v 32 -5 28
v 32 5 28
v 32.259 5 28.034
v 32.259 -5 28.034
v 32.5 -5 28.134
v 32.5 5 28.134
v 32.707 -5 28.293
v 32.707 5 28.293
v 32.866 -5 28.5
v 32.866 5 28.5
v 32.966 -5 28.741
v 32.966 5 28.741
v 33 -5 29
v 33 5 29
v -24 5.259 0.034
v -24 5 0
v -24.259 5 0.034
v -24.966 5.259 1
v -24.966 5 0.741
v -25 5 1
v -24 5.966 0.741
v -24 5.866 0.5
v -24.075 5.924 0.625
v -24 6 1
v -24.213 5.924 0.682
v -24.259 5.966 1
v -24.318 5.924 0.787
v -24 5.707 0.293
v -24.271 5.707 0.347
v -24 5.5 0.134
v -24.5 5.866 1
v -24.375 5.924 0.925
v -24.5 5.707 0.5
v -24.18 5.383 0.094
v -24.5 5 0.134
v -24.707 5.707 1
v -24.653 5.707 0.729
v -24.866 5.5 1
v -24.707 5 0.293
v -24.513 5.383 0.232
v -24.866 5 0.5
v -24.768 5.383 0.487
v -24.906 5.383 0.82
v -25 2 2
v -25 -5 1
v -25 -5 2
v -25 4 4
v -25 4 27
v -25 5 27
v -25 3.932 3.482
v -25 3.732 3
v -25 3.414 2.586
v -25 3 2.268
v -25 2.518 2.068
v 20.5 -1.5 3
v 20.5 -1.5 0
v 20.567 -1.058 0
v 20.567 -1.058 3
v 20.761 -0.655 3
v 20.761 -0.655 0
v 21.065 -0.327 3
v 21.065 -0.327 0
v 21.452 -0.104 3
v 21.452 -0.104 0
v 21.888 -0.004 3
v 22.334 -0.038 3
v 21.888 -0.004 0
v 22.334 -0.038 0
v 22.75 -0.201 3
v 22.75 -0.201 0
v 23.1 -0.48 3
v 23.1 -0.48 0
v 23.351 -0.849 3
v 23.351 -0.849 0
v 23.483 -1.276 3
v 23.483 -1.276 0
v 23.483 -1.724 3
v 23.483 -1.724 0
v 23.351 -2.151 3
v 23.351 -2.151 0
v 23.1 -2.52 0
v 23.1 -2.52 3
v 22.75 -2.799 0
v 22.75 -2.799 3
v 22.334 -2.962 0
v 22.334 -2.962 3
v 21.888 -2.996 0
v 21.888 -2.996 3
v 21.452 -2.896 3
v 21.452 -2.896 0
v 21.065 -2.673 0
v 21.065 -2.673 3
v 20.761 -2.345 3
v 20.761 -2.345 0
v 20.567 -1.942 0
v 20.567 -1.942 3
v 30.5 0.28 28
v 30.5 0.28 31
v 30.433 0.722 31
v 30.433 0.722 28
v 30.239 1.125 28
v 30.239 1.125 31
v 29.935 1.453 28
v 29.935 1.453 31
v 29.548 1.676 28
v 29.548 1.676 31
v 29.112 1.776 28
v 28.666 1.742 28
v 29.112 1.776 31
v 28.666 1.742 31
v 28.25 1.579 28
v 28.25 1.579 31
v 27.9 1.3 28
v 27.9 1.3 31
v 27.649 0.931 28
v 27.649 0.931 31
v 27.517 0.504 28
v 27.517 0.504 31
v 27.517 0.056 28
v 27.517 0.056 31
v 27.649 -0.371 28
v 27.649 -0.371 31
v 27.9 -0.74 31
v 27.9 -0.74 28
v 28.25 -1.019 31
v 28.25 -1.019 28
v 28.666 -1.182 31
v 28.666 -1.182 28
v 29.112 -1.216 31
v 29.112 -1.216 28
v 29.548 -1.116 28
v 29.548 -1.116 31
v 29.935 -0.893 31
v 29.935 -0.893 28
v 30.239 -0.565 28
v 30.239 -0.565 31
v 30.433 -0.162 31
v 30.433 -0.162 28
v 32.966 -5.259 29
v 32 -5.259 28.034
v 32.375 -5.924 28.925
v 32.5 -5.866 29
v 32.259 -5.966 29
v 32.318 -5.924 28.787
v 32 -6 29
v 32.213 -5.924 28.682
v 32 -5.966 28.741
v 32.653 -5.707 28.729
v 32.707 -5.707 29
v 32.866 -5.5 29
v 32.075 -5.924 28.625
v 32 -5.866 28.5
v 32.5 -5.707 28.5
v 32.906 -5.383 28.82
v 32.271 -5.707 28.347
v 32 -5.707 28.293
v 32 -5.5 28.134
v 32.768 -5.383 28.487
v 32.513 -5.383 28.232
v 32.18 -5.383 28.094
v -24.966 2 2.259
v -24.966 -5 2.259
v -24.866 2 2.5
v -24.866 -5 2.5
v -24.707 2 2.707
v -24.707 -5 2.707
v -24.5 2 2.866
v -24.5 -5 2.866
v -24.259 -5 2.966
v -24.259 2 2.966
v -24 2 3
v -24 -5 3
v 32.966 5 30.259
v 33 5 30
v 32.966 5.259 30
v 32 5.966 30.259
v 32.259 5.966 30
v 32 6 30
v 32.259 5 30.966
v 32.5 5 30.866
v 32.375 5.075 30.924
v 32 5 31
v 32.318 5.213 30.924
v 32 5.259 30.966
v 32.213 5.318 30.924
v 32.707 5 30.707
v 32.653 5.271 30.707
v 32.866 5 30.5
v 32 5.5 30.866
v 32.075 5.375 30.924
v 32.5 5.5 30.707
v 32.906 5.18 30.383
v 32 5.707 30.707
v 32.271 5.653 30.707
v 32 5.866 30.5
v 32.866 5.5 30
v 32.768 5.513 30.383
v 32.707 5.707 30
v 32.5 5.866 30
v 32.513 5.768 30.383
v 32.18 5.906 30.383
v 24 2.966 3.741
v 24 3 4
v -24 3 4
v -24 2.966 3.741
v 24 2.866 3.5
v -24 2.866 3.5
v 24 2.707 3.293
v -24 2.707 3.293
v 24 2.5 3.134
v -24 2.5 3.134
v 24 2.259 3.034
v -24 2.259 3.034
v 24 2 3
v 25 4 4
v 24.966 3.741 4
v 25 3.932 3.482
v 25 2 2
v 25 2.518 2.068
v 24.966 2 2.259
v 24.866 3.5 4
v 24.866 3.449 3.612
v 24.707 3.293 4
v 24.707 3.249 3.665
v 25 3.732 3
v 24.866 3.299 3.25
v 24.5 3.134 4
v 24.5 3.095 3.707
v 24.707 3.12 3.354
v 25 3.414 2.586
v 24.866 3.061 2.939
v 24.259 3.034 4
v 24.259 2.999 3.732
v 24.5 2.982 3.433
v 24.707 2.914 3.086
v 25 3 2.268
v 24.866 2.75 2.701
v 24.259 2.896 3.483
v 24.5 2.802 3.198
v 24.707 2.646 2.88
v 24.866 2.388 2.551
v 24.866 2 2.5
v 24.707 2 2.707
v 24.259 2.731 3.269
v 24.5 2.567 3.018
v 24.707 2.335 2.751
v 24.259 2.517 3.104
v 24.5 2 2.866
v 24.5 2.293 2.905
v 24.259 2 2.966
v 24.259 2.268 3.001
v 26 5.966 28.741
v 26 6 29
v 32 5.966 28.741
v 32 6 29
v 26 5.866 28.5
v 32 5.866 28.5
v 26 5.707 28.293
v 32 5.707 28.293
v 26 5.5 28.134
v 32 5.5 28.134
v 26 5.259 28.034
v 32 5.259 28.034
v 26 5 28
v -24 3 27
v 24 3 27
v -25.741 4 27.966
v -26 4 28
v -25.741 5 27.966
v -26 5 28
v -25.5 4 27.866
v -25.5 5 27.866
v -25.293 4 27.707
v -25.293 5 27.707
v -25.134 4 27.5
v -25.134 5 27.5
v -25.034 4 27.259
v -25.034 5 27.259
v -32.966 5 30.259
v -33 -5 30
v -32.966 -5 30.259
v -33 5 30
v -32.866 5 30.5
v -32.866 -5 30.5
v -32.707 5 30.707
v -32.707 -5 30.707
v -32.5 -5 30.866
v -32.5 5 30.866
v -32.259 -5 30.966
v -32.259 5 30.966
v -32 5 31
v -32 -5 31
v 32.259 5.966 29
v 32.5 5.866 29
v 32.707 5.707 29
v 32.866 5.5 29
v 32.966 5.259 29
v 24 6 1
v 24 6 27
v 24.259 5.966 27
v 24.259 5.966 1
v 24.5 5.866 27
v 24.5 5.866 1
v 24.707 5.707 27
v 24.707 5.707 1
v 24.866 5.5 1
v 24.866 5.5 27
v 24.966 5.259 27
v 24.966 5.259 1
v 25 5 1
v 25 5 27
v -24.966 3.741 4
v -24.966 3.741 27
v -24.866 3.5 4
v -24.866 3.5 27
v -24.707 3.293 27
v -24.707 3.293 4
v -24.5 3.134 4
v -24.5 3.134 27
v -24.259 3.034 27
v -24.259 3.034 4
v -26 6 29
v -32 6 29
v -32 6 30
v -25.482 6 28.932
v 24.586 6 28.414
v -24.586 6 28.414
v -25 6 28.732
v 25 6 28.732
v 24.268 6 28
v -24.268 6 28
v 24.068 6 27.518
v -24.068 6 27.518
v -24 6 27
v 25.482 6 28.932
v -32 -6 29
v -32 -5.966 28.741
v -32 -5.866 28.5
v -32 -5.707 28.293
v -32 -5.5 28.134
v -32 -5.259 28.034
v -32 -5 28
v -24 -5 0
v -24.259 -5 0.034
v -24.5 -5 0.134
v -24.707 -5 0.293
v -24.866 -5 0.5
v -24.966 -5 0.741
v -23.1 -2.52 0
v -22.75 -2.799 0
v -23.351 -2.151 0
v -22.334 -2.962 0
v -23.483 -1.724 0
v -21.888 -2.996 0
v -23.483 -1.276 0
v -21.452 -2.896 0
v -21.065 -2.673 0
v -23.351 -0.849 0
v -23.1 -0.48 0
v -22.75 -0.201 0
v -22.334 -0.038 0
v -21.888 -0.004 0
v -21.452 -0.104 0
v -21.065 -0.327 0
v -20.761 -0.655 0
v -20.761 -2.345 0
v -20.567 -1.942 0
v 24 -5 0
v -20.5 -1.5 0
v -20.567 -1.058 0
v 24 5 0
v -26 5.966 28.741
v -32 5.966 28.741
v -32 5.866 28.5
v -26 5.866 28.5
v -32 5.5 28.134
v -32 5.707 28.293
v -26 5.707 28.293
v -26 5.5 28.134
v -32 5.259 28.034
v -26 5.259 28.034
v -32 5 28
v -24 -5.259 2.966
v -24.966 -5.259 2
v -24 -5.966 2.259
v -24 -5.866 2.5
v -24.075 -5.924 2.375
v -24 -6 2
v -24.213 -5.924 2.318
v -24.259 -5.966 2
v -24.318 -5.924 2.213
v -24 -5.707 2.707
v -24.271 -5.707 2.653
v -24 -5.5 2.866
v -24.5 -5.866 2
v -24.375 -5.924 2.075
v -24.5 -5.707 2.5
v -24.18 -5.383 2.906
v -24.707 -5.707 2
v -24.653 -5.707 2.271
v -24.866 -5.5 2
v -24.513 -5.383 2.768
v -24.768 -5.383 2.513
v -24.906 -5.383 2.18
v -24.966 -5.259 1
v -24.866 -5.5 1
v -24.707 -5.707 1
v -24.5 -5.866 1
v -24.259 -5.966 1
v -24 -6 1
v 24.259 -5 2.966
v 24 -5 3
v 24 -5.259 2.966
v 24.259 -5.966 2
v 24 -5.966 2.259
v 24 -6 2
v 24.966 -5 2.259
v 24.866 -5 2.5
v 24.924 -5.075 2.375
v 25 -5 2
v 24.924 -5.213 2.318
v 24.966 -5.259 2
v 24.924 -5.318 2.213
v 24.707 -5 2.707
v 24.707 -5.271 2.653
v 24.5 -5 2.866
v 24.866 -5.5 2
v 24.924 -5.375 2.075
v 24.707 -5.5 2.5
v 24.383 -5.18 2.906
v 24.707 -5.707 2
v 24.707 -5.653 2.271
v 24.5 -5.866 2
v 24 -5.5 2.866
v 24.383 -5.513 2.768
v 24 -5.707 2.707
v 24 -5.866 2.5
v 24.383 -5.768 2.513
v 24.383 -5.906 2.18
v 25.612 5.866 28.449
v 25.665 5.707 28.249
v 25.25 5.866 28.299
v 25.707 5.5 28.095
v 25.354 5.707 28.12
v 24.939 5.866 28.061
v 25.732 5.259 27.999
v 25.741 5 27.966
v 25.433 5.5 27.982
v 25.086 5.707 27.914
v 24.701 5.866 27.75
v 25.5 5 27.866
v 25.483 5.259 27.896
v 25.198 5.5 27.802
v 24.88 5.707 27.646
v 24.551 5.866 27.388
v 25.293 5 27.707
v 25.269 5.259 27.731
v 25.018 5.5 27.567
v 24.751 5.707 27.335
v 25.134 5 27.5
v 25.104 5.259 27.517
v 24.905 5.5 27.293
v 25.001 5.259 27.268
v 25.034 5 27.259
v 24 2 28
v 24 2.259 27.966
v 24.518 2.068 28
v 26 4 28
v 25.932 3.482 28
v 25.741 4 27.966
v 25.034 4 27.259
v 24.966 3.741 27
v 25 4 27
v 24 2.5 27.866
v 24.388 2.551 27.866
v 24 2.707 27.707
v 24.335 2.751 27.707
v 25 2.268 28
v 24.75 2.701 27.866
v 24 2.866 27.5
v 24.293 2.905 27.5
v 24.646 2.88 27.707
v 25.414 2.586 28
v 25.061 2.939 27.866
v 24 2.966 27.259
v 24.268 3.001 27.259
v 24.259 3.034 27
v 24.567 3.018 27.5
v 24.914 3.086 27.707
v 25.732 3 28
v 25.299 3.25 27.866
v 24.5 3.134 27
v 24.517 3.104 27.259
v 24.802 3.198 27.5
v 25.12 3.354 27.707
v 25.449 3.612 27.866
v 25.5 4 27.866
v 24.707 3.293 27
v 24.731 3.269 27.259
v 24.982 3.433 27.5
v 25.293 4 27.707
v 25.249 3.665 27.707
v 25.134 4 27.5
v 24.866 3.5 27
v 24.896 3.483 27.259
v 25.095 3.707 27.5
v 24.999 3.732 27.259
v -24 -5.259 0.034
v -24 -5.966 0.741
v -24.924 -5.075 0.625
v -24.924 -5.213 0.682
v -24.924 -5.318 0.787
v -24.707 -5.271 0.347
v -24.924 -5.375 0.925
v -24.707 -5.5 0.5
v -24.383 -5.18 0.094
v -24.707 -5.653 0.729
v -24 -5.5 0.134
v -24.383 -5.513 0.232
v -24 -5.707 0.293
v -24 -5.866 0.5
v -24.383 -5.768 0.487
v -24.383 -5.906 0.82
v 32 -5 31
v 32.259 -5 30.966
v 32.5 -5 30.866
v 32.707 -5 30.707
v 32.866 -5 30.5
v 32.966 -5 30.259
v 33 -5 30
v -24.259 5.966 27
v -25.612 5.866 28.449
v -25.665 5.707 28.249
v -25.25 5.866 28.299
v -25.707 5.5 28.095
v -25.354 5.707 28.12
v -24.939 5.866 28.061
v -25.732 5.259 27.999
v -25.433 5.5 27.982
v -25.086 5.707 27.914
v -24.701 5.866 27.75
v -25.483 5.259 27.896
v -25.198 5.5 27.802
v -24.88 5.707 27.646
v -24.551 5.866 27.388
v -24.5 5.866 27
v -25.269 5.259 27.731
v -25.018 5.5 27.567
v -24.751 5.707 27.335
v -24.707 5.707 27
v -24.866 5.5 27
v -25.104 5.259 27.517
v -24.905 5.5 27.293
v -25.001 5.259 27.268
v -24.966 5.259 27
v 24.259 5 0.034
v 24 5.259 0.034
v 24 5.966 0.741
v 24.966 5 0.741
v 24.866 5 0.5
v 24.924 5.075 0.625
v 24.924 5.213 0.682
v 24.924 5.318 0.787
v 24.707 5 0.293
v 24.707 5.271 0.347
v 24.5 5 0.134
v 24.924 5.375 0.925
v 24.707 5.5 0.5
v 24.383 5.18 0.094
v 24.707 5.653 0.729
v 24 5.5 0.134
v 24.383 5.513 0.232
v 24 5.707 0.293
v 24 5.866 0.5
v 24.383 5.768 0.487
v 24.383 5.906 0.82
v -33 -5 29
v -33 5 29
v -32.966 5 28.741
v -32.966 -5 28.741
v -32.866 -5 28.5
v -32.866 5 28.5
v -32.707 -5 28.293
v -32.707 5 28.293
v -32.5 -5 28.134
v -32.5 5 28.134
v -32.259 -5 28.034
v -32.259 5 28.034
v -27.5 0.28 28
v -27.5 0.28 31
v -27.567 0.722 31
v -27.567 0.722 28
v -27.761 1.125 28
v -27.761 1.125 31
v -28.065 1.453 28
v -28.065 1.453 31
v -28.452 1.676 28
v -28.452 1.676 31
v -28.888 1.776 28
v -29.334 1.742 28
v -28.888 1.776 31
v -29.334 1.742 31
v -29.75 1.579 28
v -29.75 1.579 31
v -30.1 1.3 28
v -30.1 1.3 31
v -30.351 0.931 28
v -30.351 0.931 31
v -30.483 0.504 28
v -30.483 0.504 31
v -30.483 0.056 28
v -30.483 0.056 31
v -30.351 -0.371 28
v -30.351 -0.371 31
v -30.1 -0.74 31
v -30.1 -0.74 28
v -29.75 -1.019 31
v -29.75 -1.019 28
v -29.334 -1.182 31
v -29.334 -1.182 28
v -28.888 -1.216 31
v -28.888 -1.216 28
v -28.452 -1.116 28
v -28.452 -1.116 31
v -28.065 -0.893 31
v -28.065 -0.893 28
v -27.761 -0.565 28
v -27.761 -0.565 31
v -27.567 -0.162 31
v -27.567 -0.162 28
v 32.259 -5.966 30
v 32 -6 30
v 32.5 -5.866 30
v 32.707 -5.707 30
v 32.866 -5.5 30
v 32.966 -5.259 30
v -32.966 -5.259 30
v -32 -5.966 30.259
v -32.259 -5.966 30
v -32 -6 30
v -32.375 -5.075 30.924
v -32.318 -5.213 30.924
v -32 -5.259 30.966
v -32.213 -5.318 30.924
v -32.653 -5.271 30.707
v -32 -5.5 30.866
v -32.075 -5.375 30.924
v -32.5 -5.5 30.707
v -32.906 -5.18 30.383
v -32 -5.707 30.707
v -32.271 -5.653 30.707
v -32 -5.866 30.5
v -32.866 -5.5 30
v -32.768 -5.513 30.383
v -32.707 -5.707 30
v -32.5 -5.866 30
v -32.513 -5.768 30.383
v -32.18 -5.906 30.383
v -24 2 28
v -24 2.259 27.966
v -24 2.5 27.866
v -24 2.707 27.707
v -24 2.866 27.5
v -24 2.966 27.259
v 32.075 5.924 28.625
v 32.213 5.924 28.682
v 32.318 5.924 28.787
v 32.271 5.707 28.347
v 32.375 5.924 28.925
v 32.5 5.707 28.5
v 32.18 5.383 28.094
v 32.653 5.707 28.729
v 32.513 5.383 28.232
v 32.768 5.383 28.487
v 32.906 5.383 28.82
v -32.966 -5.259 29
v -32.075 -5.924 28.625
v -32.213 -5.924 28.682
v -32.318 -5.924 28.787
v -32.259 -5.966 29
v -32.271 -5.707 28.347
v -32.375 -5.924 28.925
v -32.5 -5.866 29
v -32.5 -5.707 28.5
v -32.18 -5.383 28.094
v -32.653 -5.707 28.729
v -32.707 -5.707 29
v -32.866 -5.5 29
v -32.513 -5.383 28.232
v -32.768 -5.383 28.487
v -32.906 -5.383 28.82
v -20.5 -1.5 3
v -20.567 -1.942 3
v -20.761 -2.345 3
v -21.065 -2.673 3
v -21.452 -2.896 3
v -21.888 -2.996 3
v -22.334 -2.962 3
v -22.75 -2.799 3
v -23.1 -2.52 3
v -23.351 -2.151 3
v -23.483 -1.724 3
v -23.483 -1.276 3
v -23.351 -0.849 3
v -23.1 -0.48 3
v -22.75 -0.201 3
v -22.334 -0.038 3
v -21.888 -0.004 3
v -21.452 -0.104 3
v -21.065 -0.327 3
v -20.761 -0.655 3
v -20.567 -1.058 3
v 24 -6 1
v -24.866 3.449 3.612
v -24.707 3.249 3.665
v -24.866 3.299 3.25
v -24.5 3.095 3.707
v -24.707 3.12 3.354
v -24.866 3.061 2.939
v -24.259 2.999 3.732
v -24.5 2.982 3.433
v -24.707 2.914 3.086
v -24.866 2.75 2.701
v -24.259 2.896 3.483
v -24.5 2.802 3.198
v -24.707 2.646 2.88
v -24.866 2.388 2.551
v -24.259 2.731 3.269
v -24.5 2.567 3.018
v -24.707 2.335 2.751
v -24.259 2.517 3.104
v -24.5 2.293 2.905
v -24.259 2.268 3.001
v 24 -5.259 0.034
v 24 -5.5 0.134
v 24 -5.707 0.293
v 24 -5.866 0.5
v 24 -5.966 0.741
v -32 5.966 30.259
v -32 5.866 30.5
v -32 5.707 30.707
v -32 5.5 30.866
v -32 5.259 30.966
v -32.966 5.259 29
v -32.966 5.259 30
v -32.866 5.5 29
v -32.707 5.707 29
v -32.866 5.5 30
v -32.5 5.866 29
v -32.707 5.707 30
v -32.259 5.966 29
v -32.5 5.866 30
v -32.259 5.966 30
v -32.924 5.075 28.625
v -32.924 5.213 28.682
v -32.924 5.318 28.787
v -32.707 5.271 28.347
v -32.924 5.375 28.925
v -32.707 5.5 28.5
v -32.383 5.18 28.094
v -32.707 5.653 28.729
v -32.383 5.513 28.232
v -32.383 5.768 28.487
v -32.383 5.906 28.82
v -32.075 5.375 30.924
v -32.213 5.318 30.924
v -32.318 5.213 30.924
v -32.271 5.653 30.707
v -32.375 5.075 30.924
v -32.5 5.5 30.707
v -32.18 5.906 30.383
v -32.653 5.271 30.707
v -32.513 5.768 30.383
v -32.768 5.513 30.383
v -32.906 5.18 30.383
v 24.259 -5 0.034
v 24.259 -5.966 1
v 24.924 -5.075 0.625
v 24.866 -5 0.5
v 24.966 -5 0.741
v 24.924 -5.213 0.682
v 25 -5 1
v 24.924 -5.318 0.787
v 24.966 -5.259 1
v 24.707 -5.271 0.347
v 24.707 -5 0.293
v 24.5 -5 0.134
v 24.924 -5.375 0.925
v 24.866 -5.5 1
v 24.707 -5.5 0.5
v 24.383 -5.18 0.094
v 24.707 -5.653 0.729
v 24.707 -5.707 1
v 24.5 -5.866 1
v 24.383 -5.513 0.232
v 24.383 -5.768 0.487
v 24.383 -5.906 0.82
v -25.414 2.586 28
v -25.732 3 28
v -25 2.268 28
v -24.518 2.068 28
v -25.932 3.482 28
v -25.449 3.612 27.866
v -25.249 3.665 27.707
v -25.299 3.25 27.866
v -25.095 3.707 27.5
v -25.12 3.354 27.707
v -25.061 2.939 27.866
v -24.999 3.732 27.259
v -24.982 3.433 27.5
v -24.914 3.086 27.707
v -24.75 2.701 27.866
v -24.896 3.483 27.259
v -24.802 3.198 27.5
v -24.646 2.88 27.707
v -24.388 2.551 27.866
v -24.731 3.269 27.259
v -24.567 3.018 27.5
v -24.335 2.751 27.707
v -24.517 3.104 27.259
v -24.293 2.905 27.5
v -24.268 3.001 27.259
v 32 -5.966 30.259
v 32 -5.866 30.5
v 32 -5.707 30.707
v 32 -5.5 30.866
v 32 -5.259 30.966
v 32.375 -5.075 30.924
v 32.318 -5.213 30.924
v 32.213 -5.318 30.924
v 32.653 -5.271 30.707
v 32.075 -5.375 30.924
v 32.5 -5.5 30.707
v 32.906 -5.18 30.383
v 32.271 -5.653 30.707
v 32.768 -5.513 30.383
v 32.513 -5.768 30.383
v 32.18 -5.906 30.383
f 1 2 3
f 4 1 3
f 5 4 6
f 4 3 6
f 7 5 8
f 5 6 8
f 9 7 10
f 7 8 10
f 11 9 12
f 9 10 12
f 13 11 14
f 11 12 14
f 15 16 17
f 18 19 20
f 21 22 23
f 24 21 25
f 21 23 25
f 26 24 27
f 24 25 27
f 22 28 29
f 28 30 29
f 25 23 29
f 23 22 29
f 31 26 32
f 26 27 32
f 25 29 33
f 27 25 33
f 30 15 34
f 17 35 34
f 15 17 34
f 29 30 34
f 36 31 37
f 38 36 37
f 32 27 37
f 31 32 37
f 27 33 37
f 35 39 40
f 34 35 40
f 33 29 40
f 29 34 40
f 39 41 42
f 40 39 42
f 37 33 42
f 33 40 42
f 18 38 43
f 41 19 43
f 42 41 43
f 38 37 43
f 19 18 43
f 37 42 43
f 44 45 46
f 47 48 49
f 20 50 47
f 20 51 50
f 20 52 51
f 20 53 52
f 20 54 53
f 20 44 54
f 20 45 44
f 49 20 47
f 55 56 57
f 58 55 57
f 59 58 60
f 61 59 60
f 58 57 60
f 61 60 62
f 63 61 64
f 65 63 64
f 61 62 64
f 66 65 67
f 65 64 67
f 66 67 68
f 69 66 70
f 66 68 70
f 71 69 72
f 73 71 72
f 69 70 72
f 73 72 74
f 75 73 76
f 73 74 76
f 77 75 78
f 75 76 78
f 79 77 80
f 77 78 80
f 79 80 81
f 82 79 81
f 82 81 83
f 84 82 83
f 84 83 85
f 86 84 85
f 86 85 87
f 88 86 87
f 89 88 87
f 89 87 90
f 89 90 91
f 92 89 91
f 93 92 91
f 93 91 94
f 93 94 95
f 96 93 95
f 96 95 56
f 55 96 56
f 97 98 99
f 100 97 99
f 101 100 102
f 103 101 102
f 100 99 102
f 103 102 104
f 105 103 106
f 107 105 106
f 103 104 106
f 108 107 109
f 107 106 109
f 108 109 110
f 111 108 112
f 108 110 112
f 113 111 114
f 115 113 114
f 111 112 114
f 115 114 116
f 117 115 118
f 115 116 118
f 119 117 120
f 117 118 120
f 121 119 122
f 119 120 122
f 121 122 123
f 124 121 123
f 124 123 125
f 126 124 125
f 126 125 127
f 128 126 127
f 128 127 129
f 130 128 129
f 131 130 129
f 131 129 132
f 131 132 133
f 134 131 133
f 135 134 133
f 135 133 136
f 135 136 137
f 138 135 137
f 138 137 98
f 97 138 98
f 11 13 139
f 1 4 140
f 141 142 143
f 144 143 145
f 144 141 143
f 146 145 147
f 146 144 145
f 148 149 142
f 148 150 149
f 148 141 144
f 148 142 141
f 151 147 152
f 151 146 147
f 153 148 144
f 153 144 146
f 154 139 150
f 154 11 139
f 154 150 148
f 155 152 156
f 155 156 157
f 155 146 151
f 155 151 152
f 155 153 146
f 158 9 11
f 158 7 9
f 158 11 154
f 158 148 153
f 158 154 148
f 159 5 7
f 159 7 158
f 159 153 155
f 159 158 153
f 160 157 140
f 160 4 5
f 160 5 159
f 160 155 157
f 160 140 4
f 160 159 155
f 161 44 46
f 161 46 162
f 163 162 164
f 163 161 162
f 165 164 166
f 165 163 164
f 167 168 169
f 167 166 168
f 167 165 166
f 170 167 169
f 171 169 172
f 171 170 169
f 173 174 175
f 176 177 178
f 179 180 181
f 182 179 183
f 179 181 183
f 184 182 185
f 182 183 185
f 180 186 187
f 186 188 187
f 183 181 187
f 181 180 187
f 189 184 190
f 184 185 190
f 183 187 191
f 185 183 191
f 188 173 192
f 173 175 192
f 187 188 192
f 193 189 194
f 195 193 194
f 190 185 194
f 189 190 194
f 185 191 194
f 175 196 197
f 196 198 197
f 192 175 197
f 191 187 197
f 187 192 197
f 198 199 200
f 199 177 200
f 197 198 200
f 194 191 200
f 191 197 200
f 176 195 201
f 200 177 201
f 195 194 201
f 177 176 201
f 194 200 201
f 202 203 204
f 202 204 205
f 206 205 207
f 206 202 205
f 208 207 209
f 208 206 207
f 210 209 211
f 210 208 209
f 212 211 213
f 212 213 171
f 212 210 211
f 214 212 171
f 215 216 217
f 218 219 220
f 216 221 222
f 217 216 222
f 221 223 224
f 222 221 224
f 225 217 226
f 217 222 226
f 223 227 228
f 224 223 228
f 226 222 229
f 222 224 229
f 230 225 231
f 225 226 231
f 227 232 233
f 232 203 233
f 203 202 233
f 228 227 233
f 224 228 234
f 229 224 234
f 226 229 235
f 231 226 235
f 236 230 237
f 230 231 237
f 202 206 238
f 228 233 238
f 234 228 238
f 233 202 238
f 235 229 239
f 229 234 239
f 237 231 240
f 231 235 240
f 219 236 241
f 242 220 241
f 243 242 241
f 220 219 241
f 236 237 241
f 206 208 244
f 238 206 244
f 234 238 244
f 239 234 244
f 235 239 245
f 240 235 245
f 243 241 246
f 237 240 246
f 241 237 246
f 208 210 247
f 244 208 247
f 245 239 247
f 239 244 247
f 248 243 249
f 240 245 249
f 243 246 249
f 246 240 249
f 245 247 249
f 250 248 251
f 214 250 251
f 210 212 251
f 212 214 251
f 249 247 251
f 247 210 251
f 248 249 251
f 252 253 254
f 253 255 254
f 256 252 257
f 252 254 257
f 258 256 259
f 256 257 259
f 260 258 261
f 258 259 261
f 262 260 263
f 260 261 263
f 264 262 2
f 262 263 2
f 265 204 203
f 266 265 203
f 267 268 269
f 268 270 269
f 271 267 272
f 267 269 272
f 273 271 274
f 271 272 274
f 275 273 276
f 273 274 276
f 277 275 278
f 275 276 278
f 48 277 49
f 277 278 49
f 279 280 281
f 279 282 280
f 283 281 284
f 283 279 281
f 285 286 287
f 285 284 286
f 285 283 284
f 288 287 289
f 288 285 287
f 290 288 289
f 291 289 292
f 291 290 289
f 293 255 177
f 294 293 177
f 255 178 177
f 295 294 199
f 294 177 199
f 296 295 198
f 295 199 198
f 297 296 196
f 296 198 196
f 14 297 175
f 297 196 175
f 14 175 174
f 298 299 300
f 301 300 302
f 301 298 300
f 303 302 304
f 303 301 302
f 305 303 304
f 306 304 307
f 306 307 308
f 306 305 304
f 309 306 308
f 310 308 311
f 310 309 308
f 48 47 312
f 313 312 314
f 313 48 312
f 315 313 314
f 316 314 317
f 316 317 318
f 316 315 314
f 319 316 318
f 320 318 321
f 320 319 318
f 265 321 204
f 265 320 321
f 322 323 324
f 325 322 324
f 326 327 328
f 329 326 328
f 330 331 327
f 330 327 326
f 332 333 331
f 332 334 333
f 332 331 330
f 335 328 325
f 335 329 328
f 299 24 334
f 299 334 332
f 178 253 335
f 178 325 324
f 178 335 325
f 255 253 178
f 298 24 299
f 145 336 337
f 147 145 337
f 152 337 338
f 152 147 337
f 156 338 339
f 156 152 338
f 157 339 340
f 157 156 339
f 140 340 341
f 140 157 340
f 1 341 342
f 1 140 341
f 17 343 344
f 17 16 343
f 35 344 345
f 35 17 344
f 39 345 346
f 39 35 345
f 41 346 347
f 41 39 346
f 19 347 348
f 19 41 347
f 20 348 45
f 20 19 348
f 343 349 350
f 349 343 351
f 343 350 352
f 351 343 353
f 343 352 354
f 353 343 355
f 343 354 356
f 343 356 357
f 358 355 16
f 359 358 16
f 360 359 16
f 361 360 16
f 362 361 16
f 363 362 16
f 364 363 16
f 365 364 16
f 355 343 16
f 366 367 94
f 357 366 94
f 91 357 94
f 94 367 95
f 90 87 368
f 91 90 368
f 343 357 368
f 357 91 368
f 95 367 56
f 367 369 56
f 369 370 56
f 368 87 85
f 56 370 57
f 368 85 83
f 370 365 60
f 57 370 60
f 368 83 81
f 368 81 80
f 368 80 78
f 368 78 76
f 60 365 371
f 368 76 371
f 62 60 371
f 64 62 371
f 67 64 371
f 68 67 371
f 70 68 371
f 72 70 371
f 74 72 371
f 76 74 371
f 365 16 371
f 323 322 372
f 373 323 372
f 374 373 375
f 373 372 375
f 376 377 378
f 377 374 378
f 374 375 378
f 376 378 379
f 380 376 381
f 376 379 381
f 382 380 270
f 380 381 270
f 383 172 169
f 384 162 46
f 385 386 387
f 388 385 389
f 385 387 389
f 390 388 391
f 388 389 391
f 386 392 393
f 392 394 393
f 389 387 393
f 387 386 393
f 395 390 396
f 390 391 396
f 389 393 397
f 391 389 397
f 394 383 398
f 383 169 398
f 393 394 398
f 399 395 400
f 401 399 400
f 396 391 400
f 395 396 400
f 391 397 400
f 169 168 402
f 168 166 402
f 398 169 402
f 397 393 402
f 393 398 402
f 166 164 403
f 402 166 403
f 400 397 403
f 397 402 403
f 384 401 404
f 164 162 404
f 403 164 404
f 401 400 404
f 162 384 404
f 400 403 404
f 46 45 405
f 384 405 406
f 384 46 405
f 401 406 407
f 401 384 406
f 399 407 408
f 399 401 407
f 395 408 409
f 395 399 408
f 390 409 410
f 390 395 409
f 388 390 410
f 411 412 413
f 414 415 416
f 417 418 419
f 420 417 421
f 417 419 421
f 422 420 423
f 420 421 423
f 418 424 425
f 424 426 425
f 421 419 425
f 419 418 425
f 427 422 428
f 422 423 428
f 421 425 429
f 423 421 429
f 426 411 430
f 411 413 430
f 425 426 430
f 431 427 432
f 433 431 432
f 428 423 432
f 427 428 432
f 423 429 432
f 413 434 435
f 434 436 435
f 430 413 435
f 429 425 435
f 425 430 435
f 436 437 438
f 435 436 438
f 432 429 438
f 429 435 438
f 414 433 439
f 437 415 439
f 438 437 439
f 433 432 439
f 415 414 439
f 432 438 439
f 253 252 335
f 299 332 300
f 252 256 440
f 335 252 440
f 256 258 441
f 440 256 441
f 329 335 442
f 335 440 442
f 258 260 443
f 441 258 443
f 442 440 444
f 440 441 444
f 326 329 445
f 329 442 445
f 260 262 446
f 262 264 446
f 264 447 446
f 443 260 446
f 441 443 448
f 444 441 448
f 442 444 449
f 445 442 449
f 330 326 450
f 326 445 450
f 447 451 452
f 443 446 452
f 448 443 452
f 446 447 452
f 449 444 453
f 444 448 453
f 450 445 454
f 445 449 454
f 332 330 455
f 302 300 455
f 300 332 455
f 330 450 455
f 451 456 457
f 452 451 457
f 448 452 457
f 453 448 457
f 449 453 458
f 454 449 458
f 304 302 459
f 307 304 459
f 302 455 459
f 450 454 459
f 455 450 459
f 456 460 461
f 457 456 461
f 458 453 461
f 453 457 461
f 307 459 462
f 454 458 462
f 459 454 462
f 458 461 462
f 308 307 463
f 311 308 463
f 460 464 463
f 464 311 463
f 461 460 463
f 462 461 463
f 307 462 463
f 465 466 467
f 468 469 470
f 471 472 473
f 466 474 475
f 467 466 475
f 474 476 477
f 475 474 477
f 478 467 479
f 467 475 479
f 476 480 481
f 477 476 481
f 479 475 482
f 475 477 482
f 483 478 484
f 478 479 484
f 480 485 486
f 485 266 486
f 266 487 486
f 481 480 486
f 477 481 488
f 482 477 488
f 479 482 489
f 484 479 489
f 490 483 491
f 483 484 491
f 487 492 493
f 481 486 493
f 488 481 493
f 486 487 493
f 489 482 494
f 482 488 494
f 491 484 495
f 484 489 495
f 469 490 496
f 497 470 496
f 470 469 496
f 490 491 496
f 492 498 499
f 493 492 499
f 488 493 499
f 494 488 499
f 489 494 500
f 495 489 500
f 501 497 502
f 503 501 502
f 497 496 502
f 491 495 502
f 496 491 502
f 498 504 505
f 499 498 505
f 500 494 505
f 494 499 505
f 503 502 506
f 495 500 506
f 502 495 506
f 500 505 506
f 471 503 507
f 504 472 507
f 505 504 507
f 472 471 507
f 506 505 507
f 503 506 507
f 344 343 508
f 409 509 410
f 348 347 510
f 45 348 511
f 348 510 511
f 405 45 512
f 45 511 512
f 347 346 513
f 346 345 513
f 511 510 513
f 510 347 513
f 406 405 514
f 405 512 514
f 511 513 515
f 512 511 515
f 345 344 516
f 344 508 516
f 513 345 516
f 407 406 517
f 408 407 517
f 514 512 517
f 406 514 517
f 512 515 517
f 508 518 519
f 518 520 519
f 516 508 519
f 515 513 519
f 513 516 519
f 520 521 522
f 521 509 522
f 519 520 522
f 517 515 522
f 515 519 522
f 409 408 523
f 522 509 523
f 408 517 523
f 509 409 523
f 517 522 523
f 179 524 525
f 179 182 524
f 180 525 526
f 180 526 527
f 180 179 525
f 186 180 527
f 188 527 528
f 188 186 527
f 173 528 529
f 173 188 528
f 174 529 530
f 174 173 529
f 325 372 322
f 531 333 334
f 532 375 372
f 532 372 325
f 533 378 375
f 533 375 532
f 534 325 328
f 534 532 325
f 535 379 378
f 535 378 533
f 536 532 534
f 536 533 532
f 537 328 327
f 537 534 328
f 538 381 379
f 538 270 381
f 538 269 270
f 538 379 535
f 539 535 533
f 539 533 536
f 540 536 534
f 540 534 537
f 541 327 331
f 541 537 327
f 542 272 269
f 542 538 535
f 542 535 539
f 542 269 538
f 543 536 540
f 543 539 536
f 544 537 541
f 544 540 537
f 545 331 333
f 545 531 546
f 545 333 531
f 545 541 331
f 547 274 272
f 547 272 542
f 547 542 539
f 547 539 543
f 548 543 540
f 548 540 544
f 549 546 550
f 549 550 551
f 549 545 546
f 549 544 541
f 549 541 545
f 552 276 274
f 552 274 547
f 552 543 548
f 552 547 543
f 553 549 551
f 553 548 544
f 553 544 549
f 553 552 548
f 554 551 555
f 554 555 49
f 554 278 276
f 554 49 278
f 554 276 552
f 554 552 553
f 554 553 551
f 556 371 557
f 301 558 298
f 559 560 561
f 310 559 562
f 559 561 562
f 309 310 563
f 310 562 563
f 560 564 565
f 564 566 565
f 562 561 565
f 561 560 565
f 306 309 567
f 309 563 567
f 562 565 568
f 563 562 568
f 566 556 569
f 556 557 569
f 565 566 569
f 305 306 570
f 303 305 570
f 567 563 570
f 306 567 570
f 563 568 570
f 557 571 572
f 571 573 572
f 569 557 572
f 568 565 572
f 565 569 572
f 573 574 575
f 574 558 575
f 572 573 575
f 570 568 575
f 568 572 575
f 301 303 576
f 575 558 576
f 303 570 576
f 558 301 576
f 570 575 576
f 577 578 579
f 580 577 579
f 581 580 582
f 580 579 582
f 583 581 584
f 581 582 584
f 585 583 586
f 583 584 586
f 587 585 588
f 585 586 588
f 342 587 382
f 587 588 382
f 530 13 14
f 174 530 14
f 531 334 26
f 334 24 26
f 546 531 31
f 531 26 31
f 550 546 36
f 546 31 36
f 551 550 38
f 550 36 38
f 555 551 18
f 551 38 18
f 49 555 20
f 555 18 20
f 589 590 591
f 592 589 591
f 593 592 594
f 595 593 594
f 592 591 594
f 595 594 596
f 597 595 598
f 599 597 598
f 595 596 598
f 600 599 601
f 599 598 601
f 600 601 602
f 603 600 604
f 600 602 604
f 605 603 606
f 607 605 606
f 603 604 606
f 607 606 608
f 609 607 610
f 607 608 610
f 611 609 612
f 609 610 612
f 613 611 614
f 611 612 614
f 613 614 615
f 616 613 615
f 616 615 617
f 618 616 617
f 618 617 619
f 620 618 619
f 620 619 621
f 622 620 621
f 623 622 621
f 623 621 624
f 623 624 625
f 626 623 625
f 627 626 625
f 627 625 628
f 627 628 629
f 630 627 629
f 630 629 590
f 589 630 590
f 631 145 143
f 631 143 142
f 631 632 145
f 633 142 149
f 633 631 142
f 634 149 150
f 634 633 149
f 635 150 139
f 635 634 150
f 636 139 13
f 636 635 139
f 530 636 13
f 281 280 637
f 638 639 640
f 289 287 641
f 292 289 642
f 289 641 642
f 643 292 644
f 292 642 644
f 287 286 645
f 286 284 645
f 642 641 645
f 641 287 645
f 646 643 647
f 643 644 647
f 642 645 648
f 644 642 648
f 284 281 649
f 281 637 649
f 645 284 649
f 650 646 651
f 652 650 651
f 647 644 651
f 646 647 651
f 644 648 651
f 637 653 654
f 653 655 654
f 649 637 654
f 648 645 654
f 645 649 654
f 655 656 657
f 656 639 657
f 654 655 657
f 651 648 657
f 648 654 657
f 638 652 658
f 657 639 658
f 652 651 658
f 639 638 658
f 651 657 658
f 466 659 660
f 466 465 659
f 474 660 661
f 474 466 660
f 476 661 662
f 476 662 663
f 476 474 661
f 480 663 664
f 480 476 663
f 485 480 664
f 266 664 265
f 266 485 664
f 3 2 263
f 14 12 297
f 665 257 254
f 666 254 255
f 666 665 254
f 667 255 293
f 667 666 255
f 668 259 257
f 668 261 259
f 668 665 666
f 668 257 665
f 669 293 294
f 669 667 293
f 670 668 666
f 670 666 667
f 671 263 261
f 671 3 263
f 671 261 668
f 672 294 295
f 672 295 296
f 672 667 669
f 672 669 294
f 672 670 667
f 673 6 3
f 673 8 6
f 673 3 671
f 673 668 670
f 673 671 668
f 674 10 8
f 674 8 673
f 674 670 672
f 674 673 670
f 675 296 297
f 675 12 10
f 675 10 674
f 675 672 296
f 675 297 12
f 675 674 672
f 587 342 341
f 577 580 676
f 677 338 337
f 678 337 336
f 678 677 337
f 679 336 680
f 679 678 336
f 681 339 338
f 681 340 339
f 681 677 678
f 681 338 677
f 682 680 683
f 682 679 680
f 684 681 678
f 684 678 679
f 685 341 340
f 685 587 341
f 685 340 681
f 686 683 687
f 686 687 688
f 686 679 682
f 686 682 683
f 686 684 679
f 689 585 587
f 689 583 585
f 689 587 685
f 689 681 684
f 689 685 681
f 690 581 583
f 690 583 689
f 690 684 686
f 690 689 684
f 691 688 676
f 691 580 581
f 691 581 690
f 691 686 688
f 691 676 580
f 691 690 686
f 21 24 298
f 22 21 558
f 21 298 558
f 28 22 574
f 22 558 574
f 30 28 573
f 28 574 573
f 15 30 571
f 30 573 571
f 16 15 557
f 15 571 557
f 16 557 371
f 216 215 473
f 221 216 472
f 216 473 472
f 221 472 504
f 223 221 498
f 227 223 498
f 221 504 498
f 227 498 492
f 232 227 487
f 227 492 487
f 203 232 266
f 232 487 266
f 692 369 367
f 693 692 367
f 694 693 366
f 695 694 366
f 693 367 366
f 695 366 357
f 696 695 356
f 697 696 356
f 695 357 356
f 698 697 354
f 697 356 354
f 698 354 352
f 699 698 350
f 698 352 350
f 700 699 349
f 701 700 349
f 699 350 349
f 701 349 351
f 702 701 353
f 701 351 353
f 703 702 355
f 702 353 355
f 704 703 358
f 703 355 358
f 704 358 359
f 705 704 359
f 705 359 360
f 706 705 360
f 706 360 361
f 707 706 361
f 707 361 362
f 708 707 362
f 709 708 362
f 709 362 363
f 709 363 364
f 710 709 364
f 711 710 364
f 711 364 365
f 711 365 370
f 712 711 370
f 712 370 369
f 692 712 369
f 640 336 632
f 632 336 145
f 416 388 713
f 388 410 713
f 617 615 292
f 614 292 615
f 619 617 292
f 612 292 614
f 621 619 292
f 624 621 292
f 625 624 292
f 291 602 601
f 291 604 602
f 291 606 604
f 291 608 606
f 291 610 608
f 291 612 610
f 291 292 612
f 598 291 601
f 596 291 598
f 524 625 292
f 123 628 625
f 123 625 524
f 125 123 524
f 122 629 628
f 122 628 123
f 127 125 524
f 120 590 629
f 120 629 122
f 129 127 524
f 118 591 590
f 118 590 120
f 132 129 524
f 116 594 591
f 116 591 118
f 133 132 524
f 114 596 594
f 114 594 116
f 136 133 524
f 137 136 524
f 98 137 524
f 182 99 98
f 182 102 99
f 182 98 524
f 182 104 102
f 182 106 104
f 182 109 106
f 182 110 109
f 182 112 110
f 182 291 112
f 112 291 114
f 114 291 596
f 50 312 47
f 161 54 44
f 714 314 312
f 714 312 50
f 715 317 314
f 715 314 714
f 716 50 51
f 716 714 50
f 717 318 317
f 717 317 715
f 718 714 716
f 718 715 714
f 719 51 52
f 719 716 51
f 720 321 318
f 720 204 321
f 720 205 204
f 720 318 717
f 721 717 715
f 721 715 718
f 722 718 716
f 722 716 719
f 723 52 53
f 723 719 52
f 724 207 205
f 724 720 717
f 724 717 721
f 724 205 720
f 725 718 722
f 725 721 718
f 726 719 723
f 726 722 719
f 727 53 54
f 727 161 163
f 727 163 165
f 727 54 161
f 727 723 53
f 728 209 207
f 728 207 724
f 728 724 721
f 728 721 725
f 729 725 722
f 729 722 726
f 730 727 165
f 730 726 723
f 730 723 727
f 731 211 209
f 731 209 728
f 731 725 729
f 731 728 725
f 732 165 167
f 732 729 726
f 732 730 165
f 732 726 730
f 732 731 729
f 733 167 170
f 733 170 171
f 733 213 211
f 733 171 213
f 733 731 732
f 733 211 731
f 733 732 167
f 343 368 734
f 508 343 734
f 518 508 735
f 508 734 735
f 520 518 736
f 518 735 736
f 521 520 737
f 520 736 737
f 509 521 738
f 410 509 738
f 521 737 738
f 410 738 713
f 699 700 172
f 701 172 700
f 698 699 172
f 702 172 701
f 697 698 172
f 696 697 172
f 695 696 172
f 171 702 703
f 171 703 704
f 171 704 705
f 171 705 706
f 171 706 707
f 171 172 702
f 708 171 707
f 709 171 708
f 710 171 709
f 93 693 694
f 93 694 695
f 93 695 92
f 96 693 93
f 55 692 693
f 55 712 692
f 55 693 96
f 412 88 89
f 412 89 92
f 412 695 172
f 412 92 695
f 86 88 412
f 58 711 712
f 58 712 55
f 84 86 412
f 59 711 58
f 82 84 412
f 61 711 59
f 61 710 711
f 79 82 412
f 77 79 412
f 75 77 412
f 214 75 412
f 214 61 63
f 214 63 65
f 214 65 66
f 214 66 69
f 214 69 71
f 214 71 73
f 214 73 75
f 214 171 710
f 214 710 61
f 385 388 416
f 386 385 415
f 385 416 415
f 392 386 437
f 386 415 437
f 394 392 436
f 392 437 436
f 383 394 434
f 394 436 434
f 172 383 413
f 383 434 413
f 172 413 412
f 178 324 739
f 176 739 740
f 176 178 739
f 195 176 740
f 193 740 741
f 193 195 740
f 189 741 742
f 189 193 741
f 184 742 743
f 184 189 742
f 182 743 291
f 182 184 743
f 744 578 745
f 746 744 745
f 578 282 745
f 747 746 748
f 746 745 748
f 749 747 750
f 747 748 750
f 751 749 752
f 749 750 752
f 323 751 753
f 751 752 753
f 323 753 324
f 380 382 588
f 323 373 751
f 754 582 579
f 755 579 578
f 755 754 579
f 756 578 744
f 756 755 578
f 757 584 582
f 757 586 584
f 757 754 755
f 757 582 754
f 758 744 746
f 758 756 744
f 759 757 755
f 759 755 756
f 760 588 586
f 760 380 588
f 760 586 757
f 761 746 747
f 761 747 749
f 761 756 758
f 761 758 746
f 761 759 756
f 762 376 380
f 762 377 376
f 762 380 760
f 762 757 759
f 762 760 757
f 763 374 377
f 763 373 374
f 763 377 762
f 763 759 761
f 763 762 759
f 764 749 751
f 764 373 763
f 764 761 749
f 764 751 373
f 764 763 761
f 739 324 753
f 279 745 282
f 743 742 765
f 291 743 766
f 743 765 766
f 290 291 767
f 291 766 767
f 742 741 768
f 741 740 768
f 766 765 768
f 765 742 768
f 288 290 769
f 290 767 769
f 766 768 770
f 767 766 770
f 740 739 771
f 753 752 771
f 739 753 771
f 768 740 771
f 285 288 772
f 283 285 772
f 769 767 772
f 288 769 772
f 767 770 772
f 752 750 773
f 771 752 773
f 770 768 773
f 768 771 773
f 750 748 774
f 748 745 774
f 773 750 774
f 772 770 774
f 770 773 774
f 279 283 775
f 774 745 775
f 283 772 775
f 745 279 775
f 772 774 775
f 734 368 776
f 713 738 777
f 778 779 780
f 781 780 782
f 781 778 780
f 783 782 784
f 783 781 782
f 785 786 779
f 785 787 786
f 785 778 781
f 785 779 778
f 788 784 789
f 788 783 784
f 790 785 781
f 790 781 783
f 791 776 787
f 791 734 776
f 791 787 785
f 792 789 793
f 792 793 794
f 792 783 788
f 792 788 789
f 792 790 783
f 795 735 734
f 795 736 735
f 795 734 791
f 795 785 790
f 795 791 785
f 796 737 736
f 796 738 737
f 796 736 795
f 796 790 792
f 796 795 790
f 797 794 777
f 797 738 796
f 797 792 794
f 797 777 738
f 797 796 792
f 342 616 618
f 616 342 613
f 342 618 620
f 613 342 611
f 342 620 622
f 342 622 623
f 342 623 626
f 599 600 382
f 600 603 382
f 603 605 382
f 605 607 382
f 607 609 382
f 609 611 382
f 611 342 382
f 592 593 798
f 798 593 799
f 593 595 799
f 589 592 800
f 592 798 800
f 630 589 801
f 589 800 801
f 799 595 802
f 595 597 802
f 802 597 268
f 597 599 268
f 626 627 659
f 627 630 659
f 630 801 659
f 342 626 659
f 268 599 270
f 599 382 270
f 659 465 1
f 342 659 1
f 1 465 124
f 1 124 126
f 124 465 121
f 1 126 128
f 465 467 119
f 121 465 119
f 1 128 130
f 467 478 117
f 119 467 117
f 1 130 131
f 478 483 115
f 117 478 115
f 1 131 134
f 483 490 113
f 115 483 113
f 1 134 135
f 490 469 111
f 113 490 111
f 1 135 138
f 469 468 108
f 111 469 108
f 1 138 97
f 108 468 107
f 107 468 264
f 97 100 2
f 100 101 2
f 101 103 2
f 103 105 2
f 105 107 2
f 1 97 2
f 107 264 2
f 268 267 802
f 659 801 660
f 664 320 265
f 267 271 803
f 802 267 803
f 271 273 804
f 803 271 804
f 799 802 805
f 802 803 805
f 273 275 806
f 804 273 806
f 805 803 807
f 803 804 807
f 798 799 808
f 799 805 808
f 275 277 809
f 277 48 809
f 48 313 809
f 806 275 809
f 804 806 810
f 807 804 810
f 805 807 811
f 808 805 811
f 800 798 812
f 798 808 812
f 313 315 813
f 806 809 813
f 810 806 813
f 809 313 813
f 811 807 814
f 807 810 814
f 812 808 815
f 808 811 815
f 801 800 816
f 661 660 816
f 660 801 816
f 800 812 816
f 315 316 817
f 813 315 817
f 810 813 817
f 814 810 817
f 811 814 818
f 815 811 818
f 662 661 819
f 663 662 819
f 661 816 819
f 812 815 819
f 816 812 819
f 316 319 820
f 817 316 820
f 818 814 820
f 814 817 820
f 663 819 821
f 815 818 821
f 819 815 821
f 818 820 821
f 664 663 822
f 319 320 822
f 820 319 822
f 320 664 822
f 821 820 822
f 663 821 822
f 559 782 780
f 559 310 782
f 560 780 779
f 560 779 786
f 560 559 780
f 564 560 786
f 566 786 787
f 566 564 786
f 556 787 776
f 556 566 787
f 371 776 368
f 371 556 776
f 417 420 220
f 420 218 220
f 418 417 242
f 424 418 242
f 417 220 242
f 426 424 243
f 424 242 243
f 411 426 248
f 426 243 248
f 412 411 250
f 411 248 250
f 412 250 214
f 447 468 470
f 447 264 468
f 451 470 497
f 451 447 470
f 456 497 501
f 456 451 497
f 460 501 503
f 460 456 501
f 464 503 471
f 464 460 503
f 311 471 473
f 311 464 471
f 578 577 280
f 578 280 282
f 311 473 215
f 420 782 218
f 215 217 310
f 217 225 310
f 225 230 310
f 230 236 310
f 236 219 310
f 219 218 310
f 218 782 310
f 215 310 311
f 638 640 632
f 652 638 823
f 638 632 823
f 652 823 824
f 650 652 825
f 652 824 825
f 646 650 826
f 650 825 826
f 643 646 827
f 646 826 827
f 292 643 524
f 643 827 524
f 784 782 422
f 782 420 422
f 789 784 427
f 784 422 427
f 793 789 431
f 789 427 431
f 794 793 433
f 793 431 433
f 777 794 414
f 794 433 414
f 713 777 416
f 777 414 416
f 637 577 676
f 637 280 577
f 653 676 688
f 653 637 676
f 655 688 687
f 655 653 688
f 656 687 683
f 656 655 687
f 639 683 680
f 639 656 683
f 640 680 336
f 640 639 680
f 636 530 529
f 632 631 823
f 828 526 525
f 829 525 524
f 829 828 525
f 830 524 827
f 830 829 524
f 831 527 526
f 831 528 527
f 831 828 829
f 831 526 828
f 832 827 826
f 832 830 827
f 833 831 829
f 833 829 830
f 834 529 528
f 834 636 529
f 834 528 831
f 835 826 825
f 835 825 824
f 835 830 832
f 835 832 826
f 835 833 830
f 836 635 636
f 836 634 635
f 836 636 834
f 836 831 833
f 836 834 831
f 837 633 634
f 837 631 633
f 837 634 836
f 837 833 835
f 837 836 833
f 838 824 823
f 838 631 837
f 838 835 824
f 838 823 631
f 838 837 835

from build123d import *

# Parameters (mm, degrees)
SCHIZZO1_W                   = 50
SCHIZZO1_H                   = 12
ESTRUSIONE_ESTRUSIONE1_DEPTH = 3
SCHIZZO2_W                   = 50
SCHIZZO2_H                   = 3
ESTRUSIONE_ESTRUSIONE2_DEPTH = 25
SCHIZZO3_W                   = 66
SCHIZZO3_H                   = 12
ESTRUSIONE_ESTRUSIONE3_DEPTH = 3
SCHIZZO5_R                   = 1.5
TAGLIO_ESTRUSIONE1_DEPTH     = 6
SCHIZZO6_R                   = 1.5
TAGLIO_ESTRUSIONE2_DEPTH     = 6
RACCORDO1_R                  = 1


with BuildPart() as part:
    # Schizzo1 → Estrusione-Estrusione1 (new body)
    with BuildSketch(Plane.XY):
        Rectangle(SCHIZZO1_W, SCHIZZO1_H)
    extrude(amount=ESTRUSIONE_ESTRUSIONE1_DEPTH)

    # Schizzo2 → Estrusione-Estrusione2 (add)
    with BuildSketch(Plane.XY.offset(3)):
        with Locations((0, 4.5)):
            Rectangle(SCHIZZO2_W, SCHIZZO2_H)
    extrude(amount=ESTRUSIONE_ESTRUSIONE2_DEPTH)

    # Schizzo3 → Estrusione-Estrusione3 (add)
    with BuildSketch(Plane.XY.offset(28)):
        Rectangle(SCHIZZO3_W, SCHIZZO3_H)
    extrude(amount=ESTRUSIONE_ESTRUSIONE3_DEPTH)

    # Schizzo5 → Taglio-Estrusione1 (cut)
    with BuildSketch(Plane.XY.offset(31)):
        with Locations((29, 0.28)):
            Circle(SCHIZZO5_R)
        with Locations((-29, 0.28)):
            Circle(SCHIZZO5_R)
    extrude(amount=-TAGLIO_ESTRUSIONE1_DEPTH, mode=Mode.SUBTRACT)

    # Schizzo6 → Taglio-Estrusione2 (cut)
    with BuildSketch(Plane(origin=(0, 0, 0), x_dir=(-1, 0, 0), z_dir=(0, 0, -1))):
        with Locations((-22, -1.5)):
            Circle(SCHIZZO6_R)
        with Locations(Location((22, -1.5, 0), (0, 0, 180))):
            Circle(SCHIZZO6_R)
    extrude(amount=-TAGLIO_ESTRUSIONE2_DEPTH, mode=Mode.SUBTRACT)

    # Raccordo1
    raccordo1_edges = [part.edges().sort_by_distance(p)[0] for p in [
        (-25, -1.5, 3),
        (0, -6, 3),
        (0, 3, 3),
        (-25, 3, 15.5),
        (25, 3, 15.5),
        (-25, 4.5, 28),
        (0, 3, 28),
        (25, 4.5, 28),
        (33, 0, 28),
        (33, -6, 29.5),
        (29, 6, 28),
        (-29, 6, 28),
        (33, 6, 29.5),
        (-33, 0, 28),
        (-33, 6, 29.5),
        (0, -6, 28),
        (-33, -6, 29.5),
        (33, 0, 31),
        (0, 6, 31),
        (-33, 0, 31),
        (0, -6, 31),
        (25, -1.5, 3),
        (0, -6, 0),
        (-25, 0, 0),
        (0, 6, 0),
        (25, 0, 0),
        (25, -6, 1.5),
        (-25, -6, 1.5),
        (-25, 6, 14),
        (25, 6, 14),
    ]]
    fillet(raccordo1_edges, radius=RACCORDO1_R)


solid = part.part
